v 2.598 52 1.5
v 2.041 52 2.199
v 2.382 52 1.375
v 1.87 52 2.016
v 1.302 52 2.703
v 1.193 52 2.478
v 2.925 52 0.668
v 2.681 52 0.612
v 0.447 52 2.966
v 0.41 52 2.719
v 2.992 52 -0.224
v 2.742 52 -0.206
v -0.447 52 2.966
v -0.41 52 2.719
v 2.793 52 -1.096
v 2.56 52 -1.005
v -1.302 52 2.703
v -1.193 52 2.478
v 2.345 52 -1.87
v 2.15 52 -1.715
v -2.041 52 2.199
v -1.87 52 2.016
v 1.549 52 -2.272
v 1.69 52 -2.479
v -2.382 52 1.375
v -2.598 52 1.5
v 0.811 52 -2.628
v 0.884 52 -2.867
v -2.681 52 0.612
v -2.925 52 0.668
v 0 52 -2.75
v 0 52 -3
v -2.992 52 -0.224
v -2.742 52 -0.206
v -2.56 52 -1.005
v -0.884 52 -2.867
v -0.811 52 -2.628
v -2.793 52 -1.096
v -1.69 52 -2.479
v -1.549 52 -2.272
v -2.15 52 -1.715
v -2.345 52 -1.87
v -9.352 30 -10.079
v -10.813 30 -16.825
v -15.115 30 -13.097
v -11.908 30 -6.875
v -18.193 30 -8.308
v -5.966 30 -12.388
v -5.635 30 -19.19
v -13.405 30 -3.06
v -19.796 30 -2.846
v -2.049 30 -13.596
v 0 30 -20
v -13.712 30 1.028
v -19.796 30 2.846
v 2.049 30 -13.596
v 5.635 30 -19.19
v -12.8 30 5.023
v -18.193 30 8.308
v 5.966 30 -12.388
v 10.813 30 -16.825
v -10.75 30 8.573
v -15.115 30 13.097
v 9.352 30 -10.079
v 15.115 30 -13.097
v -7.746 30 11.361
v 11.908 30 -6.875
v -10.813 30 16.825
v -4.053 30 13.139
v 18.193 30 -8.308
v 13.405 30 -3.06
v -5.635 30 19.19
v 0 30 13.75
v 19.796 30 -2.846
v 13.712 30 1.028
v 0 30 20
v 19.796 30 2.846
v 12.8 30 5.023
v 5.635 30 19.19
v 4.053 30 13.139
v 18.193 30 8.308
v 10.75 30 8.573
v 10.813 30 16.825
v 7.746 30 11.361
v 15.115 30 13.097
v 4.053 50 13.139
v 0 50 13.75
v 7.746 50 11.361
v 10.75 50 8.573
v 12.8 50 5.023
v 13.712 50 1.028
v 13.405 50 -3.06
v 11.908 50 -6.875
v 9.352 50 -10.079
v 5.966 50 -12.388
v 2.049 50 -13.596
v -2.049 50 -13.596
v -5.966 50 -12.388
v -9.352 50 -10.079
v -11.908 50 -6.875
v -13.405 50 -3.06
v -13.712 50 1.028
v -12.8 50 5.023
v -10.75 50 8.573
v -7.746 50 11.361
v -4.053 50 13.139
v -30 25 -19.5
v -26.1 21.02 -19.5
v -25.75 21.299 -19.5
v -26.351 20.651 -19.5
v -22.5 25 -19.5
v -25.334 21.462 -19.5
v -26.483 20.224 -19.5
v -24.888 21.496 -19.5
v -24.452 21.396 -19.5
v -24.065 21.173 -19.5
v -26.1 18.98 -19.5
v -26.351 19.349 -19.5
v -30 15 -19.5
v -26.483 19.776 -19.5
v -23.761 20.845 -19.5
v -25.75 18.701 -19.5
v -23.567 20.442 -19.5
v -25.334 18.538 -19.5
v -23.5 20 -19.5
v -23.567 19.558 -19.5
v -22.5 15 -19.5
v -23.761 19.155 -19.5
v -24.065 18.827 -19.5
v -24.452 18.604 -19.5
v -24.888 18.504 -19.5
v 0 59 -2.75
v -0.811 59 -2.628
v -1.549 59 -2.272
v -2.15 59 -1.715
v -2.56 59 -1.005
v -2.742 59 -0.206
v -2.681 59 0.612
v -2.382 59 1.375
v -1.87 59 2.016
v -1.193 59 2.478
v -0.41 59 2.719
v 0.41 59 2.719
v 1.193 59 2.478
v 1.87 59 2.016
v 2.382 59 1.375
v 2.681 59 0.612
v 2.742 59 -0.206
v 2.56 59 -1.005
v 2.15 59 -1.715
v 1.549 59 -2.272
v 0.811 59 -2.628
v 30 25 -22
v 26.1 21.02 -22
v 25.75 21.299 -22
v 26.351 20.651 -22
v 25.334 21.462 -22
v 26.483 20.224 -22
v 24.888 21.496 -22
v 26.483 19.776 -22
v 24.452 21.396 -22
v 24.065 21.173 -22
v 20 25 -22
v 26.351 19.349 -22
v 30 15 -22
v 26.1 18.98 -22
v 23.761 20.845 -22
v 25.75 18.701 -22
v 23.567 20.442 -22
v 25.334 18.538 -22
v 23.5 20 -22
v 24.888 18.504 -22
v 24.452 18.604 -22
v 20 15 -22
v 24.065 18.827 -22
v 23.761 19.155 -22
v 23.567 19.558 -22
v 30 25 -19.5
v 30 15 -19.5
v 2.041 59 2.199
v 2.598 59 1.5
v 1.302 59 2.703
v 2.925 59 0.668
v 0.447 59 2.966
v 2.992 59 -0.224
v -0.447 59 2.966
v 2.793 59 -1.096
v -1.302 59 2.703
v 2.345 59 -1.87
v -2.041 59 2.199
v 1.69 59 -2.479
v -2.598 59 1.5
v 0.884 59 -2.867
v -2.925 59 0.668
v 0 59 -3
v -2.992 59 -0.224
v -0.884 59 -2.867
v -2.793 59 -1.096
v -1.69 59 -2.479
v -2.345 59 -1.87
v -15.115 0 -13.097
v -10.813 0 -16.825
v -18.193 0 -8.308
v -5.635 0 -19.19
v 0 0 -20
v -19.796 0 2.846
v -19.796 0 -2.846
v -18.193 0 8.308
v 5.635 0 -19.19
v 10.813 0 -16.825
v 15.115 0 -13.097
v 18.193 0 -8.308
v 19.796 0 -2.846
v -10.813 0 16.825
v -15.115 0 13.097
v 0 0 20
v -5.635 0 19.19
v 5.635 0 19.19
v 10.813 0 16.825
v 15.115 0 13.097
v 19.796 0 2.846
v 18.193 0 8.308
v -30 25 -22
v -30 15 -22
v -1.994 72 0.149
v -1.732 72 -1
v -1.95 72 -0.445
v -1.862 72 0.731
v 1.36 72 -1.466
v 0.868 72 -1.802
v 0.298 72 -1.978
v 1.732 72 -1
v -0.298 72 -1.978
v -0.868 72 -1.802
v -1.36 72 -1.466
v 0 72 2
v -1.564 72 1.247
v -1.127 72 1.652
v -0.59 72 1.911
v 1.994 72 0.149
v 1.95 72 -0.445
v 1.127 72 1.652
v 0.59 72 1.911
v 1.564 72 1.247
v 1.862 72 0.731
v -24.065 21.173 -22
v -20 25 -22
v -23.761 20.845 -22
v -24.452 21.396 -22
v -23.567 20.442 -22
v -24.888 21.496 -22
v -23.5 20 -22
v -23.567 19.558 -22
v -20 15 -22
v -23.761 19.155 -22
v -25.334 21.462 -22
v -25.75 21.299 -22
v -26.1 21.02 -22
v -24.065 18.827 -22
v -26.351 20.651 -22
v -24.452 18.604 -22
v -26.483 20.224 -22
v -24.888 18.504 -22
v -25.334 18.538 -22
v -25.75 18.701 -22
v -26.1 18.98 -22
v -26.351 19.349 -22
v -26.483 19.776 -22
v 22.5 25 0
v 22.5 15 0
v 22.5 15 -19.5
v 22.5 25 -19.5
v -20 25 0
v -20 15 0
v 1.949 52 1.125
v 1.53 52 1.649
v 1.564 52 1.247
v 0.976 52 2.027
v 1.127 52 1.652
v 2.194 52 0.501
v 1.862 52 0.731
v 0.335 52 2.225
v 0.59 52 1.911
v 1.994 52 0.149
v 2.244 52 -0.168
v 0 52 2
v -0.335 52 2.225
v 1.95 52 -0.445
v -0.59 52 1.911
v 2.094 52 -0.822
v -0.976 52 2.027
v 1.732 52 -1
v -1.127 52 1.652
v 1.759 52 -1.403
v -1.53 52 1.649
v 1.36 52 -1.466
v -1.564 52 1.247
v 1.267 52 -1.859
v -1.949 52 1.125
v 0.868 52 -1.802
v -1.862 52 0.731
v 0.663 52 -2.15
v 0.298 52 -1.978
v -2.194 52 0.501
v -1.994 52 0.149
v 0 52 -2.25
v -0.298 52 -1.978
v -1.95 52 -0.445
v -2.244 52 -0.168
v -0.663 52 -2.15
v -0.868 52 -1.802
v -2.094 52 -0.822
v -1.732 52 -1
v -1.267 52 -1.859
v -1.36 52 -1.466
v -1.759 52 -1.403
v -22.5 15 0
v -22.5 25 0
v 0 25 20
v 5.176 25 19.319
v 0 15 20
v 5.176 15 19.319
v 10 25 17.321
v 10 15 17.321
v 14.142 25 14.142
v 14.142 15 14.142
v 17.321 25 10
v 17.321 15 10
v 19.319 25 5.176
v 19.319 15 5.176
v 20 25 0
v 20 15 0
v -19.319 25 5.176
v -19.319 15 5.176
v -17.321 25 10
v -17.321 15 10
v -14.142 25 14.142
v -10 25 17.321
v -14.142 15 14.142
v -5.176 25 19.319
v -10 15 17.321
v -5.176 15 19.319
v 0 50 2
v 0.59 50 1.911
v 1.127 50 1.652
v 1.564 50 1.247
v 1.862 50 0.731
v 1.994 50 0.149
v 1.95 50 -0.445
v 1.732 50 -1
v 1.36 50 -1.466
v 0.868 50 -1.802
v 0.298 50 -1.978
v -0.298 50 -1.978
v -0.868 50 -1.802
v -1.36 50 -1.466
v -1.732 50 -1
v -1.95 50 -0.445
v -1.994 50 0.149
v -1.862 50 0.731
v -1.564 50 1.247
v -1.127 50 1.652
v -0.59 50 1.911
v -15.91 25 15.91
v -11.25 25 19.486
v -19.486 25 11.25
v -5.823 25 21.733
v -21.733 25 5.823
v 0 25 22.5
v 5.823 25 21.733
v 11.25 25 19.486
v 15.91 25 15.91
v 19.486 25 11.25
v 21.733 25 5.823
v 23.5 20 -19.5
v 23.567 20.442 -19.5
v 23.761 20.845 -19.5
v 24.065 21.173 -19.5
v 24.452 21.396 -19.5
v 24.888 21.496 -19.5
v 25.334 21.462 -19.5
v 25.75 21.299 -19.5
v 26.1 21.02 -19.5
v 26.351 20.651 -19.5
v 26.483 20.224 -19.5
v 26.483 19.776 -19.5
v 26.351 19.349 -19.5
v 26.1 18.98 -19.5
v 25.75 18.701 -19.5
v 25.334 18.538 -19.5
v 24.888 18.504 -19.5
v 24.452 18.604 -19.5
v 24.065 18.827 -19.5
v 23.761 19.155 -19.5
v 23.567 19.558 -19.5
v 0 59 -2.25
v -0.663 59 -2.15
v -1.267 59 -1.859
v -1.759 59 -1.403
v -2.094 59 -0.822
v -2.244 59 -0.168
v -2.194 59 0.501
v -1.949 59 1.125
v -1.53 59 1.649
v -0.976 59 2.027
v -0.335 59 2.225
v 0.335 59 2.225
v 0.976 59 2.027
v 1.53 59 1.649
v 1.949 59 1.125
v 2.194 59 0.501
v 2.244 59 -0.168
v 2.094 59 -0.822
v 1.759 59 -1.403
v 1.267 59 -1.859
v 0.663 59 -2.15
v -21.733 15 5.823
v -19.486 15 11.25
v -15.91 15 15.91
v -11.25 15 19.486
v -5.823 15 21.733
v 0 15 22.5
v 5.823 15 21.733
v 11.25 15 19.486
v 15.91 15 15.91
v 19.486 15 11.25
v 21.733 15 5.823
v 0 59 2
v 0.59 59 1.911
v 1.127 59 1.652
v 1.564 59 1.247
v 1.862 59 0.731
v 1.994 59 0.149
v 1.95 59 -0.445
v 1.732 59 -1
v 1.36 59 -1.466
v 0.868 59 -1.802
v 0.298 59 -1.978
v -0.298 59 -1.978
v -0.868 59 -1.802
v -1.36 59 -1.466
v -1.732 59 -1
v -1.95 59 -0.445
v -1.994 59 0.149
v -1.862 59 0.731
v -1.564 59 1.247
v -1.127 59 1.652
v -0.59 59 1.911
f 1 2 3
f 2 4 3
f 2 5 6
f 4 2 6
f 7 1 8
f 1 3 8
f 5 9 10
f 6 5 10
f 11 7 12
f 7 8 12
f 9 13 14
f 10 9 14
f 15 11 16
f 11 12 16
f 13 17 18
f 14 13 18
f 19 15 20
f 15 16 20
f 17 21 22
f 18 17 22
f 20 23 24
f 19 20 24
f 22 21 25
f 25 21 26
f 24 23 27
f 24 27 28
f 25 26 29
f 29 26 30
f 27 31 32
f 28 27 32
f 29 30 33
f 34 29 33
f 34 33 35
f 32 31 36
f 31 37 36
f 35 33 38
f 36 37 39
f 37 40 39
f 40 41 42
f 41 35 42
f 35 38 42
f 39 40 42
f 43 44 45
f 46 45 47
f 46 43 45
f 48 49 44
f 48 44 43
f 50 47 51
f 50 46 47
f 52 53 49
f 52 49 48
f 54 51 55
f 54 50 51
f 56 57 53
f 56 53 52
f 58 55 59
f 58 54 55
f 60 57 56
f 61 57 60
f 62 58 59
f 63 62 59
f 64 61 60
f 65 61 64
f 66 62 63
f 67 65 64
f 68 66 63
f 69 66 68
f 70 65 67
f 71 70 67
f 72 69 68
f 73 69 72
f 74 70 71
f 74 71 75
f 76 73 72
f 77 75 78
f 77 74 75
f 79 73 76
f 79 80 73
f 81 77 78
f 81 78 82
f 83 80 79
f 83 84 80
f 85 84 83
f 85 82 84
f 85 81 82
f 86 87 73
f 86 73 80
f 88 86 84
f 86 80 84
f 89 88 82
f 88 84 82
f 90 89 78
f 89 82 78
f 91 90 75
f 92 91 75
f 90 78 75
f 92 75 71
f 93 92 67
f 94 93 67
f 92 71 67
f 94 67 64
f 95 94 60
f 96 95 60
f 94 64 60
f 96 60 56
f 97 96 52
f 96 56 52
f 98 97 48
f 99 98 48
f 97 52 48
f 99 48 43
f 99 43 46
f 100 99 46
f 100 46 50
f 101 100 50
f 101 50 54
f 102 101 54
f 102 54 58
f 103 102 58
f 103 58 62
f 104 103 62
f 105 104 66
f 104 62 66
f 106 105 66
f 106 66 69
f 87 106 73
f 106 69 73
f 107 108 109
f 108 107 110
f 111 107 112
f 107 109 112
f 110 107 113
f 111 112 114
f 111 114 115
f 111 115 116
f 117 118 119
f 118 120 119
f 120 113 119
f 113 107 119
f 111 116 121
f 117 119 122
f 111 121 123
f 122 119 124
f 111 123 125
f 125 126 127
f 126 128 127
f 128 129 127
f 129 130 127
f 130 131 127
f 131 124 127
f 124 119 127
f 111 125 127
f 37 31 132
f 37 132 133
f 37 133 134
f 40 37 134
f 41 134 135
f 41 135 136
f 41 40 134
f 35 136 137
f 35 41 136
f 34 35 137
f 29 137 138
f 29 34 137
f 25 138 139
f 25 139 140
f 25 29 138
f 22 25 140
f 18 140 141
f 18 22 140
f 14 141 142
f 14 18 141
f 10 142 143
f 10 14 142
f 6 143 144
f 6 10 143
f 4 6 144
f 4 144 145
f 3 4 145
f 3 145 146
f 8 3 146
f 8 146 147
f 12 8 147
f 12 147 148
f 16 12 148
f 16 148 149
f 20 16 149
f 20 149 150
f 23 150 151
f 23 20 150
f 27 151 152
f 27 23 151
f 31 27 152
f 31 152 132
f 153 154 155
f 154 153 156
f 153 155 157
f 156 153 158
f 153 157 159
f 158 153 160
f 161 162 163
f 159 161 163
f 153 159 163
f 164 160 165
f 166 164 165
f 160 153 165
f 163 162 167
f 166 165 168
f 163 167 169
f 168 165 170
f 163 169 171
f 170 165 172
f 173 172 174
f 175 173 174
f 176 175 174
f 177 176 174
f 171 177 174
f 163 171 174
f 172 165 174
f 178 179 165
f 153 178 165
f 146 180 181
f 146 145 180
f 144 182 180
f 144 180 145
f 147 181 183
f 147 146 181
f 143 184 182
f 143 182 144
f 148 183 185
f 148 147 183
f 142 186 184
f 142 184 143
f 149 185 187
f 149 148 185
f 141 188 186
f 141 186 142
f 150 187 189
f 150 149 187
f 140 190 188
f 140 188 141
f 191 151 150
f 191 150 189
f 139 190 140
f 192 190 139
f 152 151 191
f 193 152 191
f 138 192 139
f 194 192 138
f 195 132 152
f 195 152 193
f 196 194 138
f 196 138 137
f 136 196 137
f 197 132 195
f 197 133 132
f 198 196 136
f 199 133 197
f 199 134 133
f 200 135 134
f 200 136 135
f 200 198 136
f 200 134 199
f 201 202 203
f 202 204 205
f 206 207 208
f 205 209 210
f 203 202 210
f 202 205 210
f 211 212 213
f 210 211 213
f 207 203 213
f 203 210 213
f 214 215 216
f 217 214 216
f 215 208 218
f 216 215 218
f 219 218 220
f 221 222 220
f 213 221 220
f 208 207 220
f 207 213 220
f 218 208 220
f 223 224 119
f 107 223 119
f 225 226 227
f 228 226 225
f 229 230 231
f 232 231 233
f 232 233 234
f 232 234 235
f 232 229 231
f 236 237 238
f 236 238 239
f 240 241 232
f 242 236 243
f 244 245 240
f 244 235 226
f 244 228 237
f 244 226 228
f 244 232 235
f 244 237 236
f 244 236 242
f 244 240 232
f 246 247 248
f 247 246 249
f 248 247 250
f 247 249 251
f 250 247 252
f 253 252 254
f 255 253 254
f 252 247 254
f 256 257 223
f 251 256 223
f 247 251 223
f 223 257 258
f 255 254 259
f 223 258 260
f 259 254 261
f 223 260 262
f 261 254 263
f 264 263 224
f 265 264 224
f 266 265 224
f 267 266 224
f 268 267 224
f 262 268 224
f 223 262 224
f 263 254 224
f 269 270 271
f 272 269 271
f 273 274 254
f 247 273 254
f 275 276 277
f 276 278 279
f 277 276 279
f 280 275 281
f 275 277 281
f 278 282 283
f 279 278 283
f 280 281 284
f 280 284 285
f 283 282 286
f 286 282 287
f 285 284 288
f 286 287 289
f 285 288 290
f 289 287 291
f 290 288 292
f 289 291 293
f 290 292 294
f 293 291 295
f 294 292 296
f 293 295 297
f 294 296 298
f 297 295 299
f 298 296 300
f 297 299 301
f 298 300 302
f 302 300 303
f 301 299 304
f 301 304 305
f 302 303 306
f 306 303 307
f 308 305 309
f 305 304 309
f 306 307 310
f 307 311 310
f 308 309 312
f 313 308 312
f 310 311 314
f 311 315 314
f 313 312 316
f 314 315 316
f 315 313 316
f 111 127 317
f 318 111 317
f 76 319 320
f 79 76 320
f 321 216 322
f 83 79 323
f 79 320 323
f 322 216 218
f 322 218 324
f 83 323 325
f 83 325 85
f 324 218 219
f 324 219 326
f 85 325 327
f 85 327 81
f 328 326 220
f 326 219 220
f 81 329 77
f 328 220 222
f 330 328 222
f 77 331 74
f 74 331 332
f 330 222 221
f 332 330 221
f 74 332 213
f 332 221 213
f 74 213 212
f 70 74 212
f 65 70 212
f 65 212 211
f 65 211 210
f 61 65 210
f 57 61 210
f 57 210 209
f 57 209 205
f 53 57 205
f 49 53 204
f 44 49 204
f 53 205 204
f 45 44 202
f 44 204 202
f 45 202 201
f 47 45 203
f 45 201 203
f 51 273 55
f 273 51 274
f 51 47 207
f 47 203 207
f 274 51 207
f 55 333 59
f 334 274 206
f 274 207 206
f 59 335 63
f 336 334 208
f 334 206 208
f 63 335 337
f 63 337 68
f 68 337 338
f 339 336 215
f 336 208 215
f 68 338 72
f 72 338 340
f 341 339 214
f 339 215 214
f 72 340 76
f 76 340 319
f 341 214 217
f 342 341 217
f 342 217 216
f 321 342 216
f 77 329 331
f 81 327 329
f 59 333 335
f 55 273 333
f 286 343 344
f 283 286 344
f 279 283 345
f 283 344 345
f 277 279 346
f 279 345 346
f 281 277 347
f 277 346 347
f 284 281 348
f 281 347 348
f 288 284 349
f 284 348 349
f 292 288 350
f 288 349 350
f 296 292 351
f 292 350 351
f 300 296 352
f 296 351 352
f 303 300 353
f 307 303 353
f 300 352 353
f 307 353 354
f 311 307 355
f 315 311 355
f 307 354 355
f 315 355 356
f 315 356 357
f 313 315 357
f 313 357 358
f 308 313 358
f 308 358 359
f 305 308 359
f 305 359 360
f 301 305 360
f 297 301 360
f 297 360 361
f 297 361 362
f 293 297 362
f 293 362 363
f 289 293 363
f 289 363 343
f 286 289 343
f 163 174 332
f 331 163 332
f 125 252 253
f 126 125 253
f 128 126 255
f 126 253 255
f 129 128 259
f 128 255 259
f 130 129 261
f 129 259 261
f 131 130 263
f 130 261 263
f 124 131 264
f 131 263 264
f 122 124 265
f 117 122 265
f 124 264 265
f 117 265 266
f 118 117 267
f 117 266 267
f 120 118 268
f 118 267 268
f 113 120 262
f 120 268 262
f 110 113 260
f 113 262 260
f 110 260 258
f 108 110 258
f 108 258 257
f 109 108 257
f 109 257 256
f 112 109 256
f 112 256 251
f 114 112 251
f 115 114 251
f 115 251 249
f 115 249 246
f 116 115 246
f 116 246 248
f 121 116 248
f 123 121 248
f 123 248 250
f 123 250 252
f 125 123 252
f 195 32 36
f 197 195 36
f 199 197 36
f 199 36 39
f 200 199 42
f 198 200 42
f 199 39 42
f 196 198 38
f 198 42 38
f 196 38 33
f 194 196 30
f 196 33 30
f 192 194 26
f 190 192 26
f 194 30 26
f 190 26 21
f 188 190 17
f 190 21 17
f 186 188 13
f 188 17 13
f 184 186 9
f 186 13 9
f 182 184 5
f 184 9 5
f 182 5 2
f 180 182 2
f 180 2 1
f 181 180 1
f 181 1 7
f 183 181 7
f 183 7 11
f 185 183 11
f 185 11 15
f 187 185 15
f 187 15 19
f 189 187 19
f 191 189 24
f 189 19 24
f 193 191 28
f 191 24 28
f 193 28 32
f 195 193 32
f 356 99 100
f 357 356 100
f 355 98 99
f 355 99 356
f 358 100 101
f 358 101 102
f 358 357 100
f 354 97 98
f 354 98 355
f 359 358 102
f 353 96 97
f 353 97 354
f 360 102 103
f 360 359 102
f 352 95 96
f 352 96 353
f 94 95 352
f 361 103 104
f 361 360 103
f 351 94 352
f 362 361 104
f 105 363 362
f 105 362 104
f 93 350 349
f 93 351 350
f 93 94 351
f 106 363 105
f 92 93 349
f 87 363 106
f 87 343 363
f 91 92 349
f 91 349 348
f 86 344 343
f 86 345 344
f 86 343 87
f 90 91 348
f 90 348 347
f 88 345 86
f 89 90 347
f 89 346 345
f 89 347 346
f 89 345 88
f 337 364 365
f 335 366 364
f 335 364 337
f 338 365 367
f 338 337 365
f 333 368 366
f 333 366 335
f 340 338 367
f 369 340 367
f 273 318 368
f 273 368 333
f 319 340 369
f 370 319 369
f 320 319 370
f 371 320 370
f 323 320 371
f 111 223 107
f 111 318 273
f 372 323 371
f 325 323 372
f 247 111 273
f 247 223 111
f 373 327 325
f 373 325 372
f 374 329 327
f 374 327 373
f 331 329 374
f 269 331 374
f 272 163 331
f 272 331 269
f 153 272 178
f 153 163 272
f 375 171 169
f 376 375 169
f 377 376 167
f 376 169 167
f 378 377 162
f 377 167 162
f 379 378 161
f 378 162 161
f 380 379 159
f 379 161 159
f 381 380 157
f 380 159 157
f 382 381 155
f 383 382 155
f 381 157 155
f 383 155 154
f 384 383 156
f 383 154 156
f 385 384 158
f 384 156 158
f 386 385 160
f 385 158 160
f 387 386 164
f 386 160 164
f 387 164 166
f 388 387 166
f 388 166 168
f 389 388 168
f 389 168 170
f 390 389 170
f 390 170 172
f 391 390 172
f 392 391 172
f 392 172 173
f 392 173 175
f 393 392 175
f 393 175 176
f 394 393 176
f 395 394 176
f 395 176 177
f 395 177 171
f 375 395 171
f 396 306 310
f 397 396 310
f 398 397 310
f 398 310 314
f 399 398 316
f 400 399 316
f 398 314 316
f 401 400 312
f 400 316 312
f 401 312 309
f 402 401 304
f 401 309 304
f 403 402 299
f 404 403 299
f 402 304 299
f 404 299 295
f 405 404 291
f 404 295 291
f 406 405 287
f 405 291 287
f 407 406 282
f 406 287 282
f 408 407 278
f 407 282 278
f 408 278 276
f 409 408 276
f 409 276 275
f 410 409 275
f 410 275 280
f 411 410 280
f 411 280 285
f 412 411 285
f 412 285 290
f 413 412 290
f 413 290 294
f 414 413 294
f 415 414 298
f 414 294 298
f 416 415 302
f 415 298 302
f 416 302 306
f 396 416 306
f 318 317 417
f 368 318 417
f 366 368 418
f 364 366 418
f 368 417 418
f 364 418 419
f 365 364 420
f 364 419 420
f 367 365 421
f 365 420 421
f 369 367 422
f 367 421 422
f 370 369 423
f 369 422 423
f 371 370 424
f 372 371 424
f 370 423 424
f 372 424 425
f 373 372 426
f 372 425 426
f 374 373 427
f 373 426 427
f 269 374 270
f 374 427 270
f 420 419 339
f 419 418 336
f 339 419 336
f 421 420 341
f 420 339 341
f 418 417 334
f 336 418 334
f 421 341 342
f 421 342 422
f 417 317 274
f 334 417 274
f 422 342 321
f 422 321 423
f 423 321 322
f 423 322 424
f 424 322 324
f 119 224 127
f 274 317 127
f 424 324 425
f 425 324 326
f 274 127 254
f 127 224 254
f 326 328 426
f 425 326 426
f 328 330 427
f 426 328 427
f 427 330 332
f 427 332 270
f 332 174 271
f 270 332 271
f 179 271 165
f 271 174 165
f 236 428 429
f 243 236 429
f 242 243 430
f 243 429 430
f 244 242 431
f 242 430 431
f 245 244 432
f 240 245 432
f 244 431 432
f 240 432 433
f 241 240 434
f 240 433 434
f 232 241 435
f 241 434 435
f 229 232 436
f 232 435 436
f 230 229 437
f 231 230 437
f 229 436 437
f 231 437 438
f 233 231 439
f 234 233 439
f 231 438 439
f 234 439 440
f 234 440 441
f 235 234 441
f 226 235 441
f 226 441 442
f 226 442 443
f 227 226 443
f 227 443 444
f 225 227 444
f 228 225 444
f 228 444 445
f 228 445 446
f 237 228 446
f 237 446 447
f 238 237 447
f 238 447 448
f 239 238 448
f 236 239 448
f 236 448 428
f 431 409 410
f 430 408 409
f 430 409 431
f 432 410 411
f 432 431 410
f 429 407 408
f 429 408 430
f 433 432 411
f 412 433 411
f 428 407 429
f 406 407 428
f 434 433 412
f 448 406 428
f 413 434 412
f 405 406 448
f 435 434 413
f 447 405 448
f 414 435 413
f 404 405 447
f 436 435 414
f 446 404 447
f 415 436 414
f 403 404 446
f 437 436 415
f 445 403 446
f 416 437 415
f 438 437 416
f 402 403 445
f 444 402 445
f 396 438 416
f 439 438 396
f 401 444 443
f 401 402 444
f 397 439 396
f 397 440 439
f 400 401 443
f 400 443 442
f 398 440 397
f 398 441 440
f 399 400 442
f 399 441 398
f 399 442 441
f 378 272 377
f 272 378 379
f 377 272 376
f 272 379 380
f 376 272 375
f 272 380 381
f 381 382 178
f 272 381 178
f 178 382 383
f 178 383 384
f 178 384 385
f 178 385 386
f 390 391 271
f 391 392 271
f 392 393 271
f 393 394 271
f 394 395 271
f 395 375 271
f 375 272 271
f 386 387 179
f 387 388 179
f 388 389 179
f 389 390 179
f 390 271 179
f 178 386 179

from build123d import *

# Parameters (mm, degrees)
SKETCH1_R           = 20
BOSS_EXTRUDE1_DEPTH = 30
SKETCH2_R           = 13.75
BOSS_EXTRUDE2_DEPTH = 20
SKETCH3_R           = 2
BOSS_EXTRUDE3_DEPTH = 22
EXTRUDE_THIN2_START = -10
EXTRUDE_THIN2_DEPTH = 10
SKETCH6_R           = 1.5
CUT_EXTRUDE1_DEPTH  = 10
SKETCH7_R           = 3
SKETCH7_R_2         = 2.75
SKETCH7_R_3         = 2.25
SKETCH7_R_4         = 2
BOSS_EXTRUDE4_DEPTH = 7


with BuildPart() as part:
    # Sketch1 → Boss-Extrude1 (new body)
    with BuildSketch(Plane(origin=(0, 0, 0), x_dir=(1, 0, 0), z_dir=(0, 1, 0))):
        with Locations(Location((0, 0, 0), (0, 0, 270))):
            Circle(SKETCH1_R)
    extrude(amount=BOSS_EXTRUDE1_DEPTH)

    # Sketch2 → Boss-Extrude2 (add)
    with BuildSketch(Plane(origin=(0, 30, 0), x_dir=(1, 0, 0), z_dir=(0, 1, 0))):
        with Locations(Location((0, 0, 0), (0, 0, 270))):
            Circle(SKETCH2_R)
    extrude(amount=BOSS_EXTRUDE2_DEPTH)

    # Sketch3 → Boss-Extrude3 (add)
    with BuildSketch(Plane(origin=(0, 50, 0), x_dir=(1, 0, 0), z_dir=(0, 1, 0))):
        with Locations(Location((0, 0, 0), (0, 0, 270))):
            Circle(SKETCH3_R)
    extrude(amount=BOSS_EXTRUDE3_DEPTH)

    # Sketch4 → Extrude-Thin2 (add)
    with BuildSketch(Plane(origin=(0, 25, 0), x_dir=(1, 0, 0), z_dir=(0, 1, 0)).offset(EXTRUDE_THIN2_START)):
        with BuildLine():
            Line((30, 22), (20, 22))
            Line((20, 22), (20, 0))
            ThreePointArc((20, 0), (0, -20), (-20, 0))
            Line((-20, 0), (-20, 22))
            Line((-20, 22), (-30, 22))
            Line((-30, 22), (-30, 19.5))
            Line((-30, 19.5), (-22.5, 19.5))
            Line((-22.5, 19.5), (-22.5, 0))
            ThreePointArc((-22.5, 0), (0, -22.5), (22.5, 0))
            Line((22.5, 0), (22.5, 19.5))
            Line((22.5, 19.5), (30, 19.5))
            Line((30, 19.5), (30, 22))
        make_face()
    extrude(amount=EXTRUDE_THIN2_DEPTH)

    # Sketch6 → Cut-Extrude1 (cut)
    with BuildSketch(Plane(origin=(0, 0, -22), x_dir=(-1, 0, 0), z_dir=(0, 0, -1))):
        with Locations((-25, 20)):
            Circle(SKETCH6_R)
        with Locations(Location((25, 20, 0), (0, 0, 180))):
            Circle(SKETCH6_R)
    extrude(amount=-CUT_EXTRUDE1_DEPTH, mode=Mode.SUBTRACT)

    # Sketch7 → Boss-Extrude4 (add)
    # profile 1 of 2: a face of its own
    with BuildSketch(Plane(origin=(0, 52, 0), x_dir=(1, 0, 0), z_dir=(0, 1, 0))):
        with Locations(Location((0, 0, 0), (0, 0, 90))):
            Circle(SKETCH7_R)
        with Locations(Location((0, 0, 0), (0, 0, 90))):
            Circle(SKETCH7_R_2, mode=Mode.SUBTRACT)
    # profile 2 of 2: a face of its own
    with BuildSketch(Plane(origin=(0, 52, 0), x_dir=(1, 0, 0), z_dir=(0, 1, 0))):
        with Locations(Location((0, 0, 0), (0, 0, 90))):
            Circle(SKETCH7_R_3)
        with Locations(Location((0, 0, 0), (0, 0, 270))):
            Circle(SKETCH7_R_4, mode=Mode.SUBTRACT)
    extrude(amount=BOSS_EXTRUDE4_DEPTH)


with BuildPart() as boss_extrude4_piece_1:
    # of the separate pieces the step leaves, piece 1, a body of its own (boss_extrude4_pieces)
    add(part.part.solids().sort_by_distance((0, 0, 20))[0])


with BuildPart() as boss_extrude4_piece_2:
    # of the separate pieces the step leaves, piece 2, a body of its own (boss_extrude4_pieces)
    add(part.part.solids().sort_by_distance((0, 52, -3))[0])


solid = Compound([boss_extrude4_piece_1.part, boss_extrude4_piece_2.part])
